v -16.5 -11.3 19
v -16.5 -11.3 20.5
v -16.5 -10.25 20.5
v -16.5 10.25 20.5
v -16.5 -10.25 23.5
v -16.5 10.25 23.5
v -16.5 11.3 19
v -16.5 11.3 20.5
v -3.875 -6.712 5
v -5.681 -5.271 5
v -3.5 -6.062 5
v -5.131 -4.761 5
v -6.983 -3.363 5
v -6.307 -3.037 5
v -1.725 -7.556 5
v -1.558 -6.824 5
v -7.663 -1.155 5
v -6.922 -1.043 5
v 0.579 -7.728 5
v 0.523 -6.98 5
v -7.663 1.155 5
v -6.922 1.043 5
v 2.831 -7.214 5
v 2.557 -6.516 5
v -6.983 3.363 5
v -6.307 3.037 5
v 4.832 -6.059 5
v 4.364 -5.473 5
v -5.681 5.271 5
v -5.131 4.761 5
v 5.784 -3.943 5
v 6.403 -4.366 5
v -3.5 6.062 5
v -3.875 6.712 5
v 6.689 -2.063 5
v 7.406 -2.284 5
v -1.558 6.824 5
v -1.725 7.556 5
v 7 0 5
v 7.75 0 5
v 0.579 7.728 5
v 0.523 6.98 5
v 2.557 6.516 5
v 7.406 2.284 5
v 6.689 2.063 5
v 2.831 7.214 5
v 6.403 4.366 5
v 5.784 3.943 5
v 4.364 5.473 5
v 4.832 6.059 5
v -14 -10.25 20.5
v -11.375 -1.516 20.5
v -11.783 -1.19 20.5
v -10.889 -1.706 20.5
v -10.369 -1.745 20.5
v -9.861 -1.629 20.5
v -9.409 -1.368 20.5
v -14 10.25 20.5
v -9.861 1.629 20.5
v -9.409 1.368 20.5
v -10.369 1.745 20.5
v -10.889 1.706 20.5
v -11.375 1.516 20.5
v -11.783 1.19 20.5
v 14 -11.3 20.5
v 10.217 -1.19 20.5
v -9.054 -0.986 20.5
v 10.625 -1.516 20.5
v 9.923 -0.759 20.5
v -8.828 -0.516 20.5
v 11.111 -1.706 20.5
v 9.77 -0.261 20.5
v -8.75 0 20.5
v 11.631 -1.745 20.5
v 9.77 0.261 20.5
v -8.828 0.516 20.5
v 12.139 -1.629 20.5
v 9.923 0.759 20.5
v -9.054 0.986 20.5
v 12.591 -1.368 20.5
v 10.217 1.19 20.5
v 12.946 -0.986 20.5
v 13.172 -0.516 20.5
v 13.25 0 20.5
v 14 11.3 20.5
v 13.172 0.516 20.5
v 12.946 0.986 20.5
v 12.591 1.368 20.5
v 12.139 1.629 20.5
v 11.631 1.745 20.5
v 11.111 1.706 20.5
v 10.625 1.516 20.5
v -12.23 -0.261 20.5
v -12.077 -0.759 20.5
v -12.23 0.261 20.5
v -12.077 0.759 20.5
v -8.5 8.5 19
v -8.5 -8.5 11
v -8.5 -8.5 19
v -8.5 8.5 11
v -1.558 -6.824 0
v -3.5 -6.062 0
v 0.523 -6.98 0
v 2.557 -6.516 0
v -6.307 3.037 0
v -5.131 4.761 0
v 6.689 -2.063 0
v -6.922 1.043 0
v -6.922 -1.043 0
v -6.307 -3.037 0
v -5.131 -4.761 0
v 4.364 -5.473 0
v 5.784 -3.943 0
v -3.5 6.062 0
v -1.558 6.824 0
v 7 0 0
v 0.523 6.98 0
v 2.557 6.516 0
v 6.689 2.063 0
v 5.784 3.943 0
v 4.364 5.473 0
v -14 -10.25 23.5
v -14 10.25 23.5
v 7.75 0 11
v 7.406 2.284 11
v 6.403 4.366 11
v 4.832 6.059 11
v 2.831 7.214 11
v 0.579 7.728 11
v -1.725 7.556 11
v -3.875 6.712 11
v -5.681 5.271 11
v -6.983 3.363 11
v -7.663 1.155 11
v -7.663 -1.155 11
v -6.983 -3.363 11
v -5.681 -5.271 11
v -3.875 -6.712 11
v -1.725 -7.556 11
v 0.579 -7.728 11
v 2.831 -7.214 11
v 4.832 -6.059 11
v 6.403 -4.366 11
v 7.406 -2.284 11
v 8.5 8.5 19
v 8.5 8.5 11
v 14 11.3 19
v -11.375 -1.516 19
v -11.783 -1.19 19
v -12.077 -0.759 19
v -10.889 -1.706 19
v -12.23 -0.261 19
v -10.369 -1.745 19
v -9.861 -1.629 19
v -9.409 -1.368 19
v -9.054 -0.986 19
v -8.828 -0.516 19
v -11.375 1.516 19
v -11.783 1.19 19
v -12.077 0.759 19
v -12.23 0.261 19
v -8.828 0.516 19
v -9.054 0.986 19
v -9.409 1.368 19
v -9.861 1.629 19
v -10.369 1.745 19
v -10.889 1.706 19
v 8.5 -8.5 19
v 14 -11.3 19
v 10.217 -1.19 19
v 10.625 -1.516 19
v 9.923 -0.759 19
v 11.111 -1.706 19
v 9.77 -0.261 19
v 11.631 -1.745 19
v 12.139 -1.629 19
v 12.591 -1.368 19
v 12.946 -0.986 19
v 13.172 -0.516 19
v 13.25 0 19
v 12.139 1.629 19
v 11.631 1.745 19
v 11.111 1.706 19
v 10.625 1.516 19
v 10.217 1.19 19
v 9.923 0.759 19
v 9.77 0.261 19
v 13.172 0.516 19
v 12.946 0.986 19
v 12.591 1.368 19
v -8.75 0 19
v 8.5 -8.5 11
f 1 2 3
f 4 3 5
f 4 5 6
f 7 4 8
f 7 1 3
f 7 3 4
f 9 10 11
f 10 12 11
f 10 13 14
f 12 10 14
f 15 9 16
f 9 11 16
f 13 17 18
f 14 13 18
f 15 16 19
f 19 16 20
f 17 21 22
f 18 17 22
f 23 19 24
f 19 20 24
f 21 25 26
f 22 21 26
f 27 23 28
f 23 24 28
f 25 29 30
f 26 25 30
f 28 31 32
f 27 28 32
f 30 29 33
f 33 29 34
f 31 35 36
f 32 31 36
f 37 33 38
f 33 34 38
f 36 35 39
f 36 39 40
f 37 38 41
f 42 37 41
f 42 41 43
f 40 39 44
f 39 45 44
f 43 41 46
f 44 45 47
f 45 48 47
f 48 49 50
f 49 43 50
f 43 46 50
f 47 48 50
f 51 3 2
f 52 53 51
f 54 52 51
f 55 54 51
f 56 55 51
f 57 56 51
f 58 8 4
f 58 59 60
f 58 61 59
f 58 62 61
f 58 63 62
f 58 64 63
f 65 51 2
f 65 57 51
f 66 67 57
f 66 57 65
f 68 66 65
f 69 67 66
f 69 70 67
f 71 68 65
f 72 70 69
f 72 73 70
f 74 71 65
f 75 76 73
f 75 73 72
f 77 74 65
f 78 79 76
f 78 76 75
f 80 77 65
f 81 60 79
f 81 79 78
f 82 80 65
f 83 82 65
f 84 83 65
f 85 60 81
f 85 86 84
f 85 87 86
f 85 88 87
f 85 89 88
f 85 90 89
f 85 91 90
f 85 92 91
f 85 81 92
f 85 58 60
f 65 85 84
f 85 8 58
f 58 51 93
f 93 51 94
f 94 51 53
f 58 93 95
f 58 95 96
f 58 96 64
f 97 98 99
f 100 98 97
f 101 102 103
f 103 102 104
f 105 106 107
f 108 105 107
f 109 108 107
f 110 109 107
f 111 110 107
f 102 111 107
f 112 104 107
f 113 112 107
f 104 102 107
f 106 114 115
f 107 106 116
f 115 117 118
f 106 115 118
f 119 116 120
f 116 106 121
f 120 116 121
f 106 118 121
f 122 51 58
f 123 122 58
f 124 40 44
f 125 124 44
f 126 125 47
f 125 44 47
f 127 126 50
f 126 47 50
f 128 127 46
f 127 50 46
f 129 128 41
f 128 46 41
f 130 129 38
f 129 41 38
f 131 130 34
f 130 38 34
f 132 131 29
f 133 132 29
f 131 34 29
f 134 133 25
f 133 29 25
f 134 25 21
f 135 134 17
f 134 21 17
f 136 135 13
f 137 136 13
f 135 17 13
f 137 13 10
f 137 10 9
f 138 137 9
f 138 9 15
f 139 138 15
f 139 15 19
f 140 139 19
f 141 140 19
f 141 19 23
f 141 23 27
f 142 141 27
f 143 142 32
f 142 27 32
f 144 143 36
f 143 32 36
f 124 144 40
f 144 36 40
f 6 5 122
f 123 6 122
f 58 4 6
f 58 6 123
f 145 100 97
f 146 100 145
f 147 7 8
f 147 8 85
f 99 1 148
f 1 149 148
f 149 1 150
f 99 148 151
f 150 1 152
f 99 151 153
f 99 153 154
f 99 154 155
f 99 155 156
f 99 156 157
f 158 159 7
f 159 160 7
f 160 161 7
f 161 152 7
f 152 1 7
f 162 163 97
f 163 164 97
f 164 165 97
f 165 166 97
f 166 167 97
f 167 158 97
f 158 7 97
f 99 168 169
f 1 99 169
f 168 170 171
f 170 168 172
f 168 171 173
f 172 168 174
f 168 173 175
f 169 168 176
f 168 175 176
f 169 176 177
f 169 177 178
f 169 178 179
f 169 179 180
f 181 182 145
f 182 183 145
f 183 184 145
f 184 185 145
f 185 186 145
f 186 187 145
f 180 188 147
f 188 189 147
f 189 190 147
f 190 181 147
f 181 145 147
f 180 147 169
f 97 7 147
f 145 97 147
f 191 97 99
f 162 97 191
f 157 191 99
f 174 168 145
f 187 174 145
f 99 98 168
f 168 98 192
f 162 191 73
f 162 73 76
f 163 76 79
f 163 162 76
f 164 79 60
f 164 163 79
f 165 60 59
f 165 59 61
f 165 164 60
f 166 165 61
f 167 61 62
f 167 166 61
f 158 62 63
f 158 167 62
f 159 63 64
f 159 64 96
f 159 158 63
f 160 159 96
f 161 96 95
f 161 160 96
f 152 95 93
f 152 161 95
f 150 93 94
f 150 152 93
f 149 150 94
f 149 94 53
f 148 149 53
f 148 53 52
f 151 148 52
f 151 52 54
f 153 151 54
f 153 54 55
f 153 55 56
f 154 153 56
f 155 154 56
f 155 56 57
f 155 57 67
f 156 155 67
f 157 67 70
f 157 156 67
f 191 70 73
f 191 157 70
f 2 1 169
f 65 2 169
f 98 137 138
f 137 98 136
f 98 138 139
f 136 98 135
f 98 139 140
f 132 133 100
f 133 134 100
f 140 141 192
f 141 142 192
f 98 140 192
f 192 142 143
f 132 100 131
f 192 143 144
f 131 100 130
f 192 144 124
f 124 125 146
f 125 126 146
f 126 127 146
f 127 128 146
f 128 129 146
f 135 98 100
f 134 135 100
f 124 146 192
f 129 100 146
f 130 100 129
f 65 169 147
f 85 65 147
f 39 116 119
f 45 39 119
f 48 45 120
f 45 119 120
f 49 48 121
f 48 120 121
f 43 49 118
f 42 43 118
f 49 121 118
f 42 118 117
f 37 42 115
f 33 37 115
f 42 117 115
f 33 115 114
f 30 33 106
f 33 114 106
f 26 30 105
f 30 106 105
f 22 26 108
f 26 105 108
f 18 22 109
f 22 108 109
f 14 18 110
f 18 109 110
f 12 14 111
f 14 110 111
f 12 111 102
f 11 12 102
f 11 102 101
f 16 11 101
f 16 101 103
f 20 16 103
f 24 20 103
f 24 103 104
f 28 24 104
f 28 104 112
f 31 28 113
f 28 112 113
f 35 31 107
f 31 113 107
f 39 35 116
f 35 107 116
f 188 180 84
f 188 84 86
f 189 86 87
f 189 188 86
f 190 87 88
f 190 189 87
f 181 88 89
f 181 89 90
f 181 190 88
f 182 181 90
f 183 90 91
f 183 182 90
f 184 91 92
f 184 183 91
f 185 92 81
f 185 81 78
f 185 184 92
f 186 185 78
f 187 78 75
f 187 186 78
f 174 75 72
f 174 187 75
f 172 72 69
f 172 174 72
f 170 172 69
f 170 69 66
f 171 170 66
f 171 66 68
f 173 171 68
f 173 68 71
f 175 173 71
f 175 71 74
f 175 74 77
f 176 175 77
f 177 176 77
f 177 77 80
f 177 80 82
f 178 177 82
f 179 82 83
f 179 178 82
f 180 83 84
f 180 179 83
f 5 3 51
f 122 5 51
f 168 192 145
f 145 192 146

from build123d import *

# Parameters (mm, degrees)
SKETCH_1_R      = 7
EXTRUDE_1_DEPTH = 5
SKETCH_2_R      = 7.75
EXTRUDE_2_DEPTH = 6
SKETCH_3_W      = 17
SKETCH_3_H      = 17
EXTRUDE_3_DEPTH = 8
SKETCH_4_W      = 30.5
SKETCH_4_H      = 22.6
SKETCH_4_R      = 1.75
EXTRUDE_4_DEPTH = 1.5
SKETCH_5_W      = 2.5
SKETCH_5_H      = 20.5
EXTRUDE_5_DEPTH = 3


with BuildPart() as part:
    # 草图1 → 凸台-拉伸1 (new body)
    with BuildSketch(Plane.XY):
        Circle(SKETCH_1_R)
    extrude(amount=EXTRUDE_1_DEPTH)

    # 草图2 → 凸台-拉伸2 (add)
    with BuildSketch(Plane.XY.offset(5)):
        Circle(SKETCH_2_R)
    extrude(amount=EXTRUDE_2_DEPTH)

    # 草图3 → 凸台-拉伸3 (add)
    with BuildSketch(Plane.XY.offset(11)):
        Rectangle(SKETCH_3_W, SKETCH_3_H)
    extrude(amount=EXTRUDE_3_DEPTH)

    # 草图4 → 凸台-拉伸4 (add)
    with BuildSketch(Plane.XY.offset(19)):
        with Locations((-1.25, 0)):
            Rectangle(SKETCH_4_W, SKETCH_4_H)
        with Locations((11.5, 0)):
            Circle(SKETCH_4_R, mode=Mode.SUBTRACT)
        with Locations((-10.5, 0)):
            Circle(SKETCH_4_R, mode=Mode.SUBTRACT)
    extrude(amount=EXTRUDE_4_DEPTH)

    # 草图5 → 凸台-拉伸5 (add)
    with BuildSketch(Plane.XY.offset(20.5)):
        with Locations((-15.25, 0)):
            Rectangle(SKETCH_5_W, SKETCH_5_H)
    extrude(amount=EXTRUDE_5_DEPTH)


solid = part.part
